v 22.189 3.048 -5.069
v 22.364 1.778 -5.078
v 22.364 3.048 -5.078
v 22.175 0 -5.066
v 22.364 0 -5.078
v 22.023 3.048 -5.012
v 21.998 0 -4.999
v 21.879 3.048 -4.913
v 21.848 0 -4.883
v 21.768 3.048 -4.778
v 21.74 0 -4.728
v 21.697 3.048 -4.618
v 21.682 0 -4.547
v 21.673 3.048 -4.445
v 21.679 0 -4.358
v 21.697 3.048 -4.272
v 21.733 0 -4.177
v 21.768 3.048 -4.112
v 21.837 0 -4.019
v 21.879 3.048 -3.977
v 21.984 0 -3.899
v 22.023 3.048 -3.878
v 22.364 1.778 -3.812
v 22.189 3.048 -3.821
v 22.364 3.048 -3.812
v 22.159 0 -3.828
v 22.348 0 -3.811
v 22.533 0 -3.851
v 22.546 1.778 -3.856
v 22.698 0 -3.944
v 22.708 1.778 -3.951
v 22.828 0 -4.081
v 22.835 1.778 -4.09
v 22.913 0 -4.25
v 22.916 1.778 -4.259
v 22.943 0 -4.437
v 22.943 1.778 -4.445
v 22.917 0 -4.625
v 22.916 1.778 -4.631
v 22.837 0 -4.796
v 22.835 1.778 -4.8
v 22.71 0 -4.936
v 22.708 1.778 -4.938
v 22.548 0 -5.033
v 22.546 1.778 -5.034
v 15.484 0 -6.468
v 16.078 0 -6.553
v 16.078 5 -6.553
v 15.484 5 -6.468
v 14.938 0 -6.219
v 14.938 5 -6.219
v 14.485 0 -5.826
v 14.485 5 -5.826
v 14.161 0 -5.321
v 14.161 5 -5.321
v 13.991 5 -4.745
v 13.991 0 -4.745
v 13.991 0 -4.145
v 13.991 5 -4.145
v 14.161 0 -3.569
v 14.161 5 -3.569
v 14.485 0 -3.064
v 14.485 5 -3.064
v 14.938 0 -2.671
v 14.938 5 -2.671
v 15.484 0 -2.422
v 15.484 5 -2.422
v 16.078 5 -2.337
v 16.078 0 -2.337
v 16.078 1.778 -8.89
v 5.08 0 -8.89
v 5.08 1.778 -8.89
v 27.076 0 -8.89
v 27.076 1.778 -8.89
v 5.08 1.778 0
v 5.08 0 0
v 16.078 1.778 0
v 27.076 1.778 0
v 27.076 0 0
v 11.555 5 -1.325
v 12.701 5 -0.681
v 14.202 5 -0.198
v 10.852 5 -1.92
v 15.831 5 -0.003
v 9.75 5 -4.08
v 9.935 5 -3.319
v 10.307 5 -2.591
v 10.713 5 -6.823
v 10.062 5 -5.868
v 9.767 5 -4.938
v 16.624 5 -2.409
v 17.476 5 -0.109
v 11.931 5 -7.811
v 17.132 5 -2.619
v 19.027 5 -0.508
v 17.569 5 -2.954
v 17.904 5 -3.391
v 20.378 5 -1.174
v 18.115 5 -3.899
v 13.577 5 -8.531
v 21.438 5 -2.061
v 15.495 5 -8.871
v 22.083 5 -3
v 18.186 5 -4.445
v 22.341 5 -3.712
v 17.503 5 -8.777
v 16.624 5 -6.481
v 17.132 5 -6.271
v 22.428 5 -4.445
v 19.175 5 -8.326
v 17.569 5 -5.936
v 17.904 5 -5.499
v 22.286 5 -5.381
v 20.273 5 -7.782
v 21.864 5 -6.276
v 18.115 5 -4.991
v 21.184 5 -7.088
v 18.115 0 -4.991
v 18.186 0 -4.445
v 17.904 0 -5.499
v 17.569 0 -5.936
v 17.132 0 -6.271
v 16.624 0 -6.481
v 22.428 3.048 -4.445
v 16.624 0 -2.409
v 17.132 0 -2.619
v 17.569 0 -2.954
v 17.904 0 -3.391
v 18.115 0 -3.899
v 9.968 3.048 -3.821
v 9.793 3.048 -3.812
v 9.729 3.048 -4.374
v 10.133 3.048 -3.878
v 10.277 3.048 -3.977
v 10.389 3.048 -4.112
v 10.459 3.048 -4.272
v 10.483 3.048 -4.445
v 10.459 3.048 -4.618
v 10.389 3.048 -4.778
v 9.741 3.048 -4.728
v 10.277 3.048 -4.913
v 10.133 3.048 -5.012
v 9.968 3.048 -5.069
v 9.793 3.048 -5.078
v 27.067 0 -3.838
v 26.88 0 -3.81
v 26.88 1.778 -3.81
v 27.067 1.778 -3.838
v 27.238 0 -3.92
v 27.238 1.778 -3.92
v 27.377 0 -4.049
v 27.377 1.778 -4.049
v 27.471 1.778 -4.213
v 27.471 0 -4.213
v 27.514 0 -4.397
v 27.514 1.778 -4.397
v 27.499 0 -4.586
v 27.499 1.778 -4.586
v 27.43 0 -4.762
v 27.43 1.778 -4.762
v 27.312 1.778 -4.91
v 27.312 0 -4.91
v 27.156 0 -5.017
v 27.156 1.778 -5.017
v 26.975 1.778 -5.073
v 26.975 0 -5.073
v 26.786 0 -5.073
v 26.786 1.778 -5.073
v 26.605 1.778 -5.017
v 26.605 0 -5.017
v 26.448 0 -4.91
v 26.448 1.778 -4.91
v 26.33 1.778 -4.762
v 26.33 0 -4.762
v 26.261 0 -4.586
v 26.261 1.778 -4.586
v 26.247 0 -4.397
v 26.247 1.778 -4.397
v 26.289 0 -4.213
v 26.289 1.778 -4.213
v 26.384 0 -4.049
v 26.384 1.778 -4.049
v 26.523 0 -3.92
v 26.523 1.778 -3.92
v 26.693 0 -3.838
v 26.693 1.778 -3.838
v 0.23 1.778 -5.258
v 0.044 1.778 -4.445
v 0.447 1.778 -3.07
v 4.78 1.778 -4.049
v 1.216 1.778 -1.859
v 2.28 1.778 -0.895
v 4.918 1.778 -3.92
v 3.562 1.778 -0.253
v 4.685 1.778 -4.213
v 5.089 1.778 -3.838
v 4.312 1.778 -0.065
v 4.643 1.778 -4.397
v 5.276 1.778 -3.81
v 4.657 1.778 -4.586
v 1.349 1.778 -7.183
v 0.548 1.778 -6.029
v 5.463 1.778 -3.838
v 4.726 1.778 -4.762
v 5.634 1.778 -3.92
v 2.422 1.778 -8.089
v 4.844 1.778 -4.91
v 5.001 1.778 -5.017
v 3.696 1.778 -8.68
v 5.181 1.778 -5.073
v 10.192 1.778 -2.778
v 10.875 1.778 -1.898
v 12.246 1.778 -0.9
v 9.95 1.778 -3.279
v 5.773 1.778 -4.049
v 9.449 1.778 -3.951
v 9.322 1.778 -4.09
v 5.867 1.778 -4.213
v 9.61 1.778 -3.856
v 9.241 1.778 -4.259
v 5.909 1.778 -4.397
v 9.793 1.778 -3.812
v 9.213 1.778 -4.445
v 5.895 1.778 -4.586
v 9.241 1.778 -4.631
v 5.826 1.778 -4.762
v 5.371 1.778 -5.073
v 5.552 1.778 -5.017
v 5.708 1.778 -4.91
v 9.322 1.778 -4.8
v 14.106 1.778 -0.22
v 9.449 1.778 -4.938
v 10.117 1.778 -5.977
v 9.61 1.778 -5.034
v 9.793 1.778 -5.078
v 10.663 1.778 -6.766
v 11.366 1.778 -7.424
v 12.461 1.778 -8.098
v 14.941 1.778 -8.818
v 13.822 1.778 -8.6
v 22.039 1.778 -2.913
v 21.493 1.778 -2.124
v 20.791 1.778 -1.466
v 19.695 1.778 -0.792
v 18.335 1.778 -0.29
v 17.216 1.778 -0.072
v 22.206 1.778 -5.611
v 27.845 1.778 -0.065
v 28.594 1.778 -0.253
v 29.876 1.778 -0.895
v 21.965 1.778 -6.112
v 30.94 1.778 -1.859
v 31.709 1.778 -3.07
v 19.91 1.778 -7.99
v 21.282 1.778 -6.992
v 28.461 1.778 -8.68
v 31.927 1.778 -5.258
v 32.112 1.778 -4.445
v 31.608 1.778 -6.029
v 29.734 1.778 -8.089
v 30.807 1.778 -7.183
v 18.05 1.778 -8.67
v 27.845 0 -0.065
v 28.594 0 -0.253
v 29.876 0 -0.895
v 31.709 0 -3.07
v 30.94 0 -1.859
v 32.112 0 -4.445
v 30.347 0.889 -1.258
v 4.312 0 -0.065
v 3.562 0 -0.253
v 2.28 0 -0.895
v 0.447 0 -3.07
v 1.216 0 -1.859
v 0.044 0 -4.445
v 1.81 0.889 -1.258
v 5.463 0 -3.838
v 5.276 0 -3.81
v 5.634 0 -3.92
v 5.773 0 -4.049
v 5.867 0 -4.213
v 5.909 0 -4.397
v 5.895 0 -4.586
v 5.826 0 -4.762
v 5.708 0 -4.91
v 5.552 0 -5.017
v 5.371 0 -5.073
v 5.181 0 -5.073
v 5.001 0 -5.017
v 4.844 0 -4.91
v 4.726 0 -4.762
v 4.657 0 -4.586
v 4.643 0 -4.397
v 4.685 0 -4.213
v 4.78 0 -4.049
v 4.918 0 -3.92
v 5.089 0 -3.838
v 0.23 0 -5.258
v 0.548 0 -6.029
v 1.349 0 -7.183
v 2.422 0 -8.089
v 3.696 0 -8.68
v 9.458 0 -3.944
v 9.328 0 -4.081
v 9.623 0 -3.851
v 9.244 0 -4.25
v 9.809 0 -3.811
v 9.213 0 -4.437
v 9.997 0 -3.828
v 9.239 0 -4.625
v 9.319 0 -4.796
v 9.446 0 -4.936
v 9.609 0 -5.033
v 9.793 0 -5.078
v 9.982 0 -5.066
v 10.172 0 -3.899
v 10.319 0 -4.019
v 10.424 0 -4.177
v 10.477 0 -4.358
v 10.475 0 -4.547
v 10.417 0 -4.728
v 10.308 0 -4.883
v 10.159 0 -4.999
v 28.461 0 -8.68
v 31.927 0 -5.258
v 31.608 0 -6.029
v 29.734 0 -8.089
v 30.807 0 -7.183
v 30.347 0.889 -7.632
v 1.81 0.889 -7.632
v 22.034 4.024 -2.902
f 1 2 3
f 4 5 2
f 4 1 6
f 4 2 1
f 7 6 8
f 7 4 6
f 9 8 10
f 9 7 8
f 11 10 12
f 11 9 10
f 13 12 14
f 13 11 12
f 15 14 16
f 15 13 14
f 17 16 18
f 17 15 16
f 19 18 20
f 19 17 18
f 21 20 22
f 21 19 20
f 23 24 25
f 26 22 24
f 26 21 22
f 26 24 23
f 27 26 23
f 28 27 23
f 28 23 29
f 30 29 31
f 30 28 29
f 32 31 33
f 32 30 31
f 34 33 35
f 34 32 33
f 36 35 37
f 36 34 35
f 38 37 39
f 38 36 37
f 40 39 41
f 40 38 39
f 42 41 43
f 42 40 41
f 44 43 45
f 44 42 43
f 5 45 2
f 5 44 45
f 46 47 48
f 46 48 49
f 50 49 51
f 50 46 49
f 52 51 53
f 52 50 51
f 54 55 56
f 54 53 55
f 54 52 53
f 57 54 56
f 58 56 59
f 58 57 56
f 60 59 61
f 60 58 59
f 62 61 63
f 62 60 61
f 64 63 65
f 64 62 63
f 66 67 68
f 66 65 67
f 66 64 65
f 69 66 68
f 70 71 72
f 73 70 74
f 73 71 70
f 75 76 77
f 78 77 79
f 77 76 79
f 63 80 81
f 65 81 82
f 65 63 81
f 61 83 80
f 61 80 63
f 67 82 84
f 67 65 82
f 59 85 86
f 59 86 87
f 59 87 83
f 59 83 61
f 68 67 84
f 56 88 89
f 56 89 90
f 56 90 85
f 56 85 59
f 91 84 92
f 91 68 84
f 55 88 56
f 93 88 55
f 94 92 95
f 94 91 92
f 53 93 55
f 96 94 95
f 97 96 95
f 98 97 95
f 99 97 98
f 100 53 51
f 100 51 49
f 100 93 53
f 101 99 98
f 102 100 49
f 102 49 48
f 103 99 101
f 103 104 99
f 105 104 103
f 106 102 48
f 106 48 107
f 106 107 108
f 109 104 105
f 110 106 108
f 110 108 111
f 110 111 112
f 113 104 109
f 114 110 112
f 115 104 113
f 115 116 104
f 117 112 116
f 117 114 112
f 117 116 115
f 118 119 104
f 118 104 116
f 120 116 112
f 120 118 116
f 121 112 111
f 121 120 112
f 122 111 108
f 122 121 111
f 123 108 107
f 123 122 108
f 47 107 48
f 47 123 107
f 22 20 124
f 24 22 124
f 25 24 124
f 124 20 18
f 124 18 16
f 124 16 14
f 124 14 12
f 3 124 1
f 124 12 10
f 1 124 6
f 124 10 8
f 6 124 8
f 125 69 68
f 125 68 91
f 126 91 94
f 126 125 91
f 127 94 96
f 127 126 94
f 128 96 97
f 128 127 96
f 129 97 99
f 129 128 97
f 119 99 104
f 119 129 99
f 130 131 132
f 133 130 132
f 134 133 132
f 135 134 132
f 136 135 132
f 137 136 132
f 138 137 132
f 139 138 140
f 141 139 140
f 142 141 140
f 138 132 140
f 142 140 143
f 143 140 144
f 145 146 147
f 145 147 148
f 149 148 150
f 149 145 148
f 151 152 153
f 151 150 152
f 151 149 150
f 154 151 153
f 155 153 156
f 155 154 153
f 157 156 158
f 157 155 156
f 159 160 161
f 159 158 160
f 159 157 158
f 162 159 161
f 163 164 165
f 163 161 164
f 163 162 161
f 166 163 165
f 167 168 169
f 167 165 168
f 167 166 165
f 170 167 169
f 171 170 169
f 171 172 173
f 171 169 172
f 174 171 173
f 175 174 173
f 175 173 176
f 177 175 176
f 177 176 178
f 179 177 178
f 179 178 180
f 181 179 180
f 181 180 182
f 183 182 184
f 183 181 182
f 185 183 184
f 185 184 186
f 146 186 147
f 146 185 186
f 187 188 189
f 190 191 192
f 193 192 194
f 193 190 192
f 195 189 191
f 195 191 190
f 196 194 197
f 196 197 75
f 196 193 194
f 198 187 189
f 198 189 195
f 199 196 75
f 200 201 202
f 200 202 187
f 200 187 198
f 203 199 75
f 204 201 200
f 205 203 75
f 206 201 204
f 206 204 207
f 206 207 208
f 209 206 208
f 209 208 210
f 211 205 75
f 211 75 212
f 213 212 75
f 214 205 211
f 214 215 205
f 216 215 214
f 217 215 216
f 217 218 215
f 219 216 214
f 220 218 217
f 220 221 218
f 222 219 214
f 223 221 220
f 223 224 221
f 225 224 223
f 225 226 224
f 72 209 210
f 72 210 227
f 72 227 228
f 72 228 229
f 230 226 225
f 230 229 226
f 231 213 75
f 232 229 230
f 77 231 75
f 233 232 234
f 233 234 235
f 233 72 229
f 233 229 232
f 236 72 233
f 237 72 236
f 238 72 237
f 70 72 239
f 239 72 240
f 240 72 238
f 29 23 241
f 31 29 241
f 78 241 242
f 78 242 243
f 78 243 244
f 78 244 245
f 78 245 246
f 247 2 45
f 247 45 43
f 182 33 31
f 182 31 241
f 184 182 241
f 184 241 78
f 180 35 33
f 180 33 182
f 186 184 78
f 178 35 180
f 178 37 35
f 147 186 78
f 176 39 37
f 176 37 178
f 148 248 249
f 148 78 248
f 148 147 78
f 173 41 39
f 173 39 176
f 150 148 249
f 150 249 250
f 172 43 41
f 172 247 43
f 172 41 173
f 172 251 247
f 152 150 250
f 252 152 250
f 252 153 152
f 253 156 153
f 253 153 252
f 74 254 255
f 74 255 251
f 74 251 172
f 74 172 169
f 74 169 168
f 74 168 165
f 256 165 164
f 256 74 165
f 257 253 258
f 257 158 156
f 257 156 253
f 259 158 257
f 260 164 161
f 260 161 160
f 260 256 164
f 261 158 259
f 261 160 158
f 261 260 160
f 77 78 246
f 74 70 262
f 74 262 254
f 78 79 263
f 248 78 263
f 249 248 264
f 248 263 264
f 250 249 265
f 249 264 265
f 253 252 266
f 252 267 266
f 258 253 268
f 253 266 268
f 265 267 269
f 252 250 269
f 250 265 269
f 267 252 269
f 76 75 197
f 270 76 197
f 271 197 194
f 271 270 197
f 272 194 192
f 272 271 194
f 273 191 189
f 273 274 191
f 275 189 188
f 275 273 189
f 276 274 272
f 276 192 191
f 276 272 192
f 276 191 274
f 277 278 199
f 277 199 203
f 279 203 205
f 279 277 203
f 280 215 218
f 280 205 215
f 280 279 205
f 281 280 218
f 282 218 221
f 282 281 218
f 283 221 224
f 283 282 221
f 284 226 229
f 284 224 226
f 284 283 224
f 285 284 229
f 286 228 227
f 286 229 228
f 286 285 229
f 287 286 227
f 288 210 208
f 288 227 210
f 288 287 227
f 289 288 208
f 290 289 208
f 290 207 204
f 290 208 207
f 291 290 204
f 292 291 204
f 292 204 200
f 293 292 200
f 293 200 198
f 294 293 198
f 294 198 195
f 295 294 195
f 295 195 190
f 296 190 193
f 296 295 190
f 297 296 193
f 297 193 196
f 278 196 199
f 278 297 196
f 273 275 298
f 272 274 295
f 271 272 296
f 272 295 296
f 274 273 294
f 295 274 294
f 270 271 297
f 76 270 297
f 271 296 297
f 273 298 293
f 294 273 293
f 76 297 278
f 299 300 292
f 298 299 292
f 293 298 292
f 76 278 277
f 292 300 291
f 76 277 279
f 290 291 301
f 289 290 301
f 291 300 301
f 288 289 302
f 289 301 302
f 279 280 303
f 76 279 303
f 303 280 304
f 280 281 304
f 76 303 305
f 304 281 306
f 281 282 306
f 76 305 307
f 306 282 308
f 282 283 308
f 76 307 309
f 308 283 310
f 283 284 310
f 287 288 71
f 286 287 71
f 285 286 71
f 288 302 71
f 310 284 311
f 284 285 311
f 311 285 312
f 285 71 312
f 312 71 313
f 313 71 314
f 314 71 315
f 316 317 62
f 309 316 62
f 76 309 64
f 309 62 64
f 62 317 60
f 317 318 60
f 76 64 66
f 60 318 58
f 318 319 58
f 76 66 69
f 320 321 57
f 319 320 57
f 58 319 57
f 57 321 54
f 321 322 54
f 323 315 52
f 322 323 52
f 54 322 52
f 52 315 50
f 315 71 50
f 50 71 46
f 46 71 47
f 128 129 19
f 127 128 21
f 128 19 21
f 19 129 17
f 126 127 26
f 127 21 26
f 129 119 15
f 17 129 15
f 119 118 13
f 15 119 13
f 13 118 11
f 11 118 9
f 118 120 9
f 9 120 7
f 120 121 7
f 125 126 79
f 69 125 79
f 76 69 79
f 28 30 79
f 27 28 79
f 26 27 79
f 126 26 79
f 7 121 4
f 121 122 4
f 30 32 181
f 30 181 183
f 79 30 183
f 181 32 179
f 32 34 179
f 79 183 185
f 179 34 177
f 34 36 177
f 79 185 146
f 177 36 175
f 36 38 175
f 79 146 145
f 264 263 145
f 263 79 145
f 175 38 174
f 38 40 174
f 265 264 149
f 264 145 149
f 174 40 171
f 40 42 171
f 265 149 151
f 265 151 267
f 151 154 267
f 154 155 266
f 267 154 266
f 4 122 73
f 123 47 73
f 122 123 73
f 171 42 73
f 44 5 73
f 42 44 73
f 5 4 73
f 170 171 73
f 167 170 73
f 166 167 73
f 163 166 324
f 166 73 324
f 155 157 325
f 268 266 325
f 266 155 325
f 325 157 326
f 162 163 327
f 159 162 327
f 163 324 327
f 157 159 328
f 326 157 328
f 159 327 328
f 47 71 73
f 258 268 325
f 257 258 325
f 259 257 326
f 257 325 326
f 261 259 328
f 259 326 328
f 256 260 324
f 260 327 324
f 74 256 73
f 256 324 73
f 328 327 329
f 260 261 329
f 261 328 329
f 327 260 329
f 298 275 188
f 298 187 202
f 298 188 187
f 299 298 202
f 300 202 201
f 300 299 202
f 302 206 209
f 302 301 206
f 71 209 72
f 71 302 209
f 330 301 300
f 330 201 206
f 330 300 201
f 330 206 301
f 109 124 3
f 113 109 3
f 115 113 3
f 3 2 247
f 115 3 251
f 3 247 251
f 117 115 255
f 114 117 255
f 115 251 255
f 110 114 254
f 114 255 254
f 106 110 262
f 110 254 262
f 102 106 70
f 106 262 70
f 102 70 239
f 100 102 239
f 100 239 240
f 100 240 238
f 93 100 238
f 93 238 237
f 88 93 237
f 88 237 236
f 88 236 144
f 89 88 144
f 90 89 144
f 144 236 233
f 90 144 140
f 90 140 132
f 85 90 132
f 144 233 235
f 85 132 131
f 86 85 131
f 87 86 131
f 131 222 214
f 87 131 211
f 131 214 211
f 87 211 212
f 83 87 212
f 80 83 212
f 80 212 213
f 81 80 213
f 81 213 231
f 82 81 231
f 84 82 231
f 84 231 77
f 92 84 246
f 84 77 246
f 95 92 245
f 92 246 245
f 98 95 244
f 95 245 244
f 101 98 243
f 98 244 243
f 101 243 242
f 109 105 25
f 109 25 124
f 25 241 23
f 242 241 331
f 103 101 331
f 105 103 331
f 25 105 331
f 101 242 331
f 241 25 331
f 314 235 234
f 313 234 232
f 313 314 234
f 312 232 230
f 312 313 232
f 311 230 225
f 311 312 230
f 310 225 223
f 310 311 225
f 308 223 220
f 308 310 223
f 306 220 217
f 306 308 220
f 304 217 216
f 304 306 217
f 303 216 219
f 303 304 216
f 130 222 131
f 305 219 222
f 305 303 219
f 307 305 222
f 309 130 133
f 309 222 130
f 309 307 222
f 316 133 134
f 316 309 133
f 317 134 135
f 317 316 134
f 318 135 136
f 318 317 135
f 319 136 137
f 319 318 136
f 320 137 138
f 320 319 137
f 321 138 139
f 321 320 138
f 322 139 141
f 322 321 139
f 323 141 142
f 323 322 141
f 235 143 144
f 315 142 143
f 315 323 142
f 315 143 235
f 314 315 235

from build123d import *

# Parameters (mm, degrees)
SKETCH1_W               = 32.1564
SKETCH1_H               = 8.89
SKETCH1_R               = 1.2319
BOSS_EXTRUDE1_DEPTH     = 1.778
CUT_EXTRUDE1_DEPTH      = 32.409990197
CUT_EXTRUDE1_DEPTH_BACK = 34.409990197
CUT_EXTRUDE1_START      = 2
FILLET1_SIZE            = 5.08
SKETCH1_7_RX            = 6.35
SKETCH1_7_RY            = 4.445
BOSS_EXTRUDE2_DEPTH     = 5
CUT_EXTRUDE2_DEPTH      = 34.69313211
CUT_EXTRUDE2_DEPTH_BACK = 34.69313211
CUT_EXTRUDE3_DEPTH      = 1.27
CUT_EXTRUDE3_DEPTH_BACK = 12.7
SKETCH2_R               = 0.635


with BuildPart() as part:
    # Sketch1 → Boss-Extrude1 (new body)
    with BuildSketch(Plane(origin=(0, 0, 0), x_dir=(1, 0, 0), z_dir=(0, 1, 0))):
        with Locations((16.0782, 4.445)):
            Rectangle(SKETCH1_W, SKETCH1_H)
        with Locations(Location((16.0782, 4.445, 0), (0, 0, 270))):
            Circle(SKETCH1_R, mode=Mode.SUBTRACT)
    extrude(amount=BOSS_EXTRUDE1_DEPTH)

    # Sketch1<5> → Cut-Extrude1 (cut, two sides: drawn at the far end of the back side and taken through both)
    with BuildSketch(Plane(origin=(0, 0, 0), x_dir=(1, 0, 0), z_dir=(0, 1, 0)).offset(CUT_EXTRUDE1_START - CUT_EXTRUDE1_DEPTH_BACK)):
        with BuildLine():
            ThreePointArc((18.1864, 4.445), (17.568922516, 5.935722516), (16.0782, 6.5532))
            Line((16.0782, 6.5532), (16.0782, 5.6769))
            ThreePointArc((16.0782, 5.6769), (16.949284844, 5.316084844), (17.3101, 4.445))
            ThreePointArc((17.3101, 4.445), (16.949284844, 3.573915156), (16.0782, 3.2131))
            Line((16.0782, 3.2131), (16.0782, 2.3368))
            ThreePointArc((16.0782, 2.3368), (17.568922516, 2.954277484), (18.1864, 4.445))
        make_face()
        with BuildLine():
            Line((16.0782, 5.6769), (16.0782, 6.5532))
            ThreePointArc((16.0782, 6.5532), (13.97, 4.445), (16.0782, 2.3368))
            Line((16.0782, 2.3368), (16.0782, 3.2131))
            ThreePointArc((16.0782, 3.2131), (14.8463, 4.445), (16.0782, 5.6769))
        make_face()
        with BuildLine():
            ThreePointArc((17.3101, 4.445), (16.949284844, 5.316084844), (16.0782, 5.6769))
            Line((16.0782, 5.6769), (16.0782, 3.2131))
            ThreePointArc((16.0782, 3.2131), (16.949284844, 3.573915156), (17.3101, 4.445))
        make_face()
        with BuildLine():
            Line((16.0782, 3.2131), (16.0782, 5.6769))
            ThreePointArc((16.0782, 5.6769), (14.8463, 4.445), (16.0782, 3.2131))
        make_face()
    extrude(amount=CUT_EXTRUDE1_DEPTH + CUT_EXTRUDE1_DEPTH_BACK, mode=Mode.SUBTRACT)

    # Fillet1
    # a fillet whose section is not a circle: 5.08 mm, written as the material it takes off along each edge
    with BuildSketch(Plane(origin=(32.1564, -12.7, -8.89), x_dir=(0, 0, 1), z_dir=(0, 1, 0)), Plane(origin=(32.1564, -12.7, 0), x_dir=(-1, 0, 0), z_dir=(0, 1, 0))) as fillet1_piece_1:
        with BuildLine():
            Bezier((FILLET1_SIZE, 0), (0, 0), (0, -FILLET1_SIZE), weights=[1, 0.666666667, 1])
            Line((0, -FILLET1_SIZE), (0, 0))
            Line((0, 0), (FILLET1_SIZE, 0))
        make_face()
    extrude(amount=27.178, mode=Mode.SUBTRACT)
    with BuildSketch(Plane(origin=(0, -12.7, -8.89), x_dir=(0, 0, 1), z_dir=(0, 1, 0)), Plane(origin=(0, -12.7, 0), x_dir=(1, 0, 0), z_dir=(0, 1, 0))) as fillet1_piece_2:
        with BuildLine():
            Bezier((FILLET1_SIZE, 0), (0, 0), (0, FILLET1_SIZE), weights=[1, 0.666666667, 1])
            Line((0, FILLET1_SIZE), (0, 0))
            Line((0, 0), (FILLET1_SIZE, 0))
        make_face()
    extrude(amount=27.178, mode=Mode.SUBTRACT)

    # Sketch1<7> → Boss-Extrude2 (add)
    with BuildSketch(Plane(origin=(0, 0, 0), x_dir=(1, 0, 0), z_dir=(0, 1, 0))):
        with Locations(Location((16.0782, 4.445), (0, 0, 0))):
            Ellipse(SKETCH1_7_RX, SKETCH1_7_RY)
    extrude(amount=BOSS_EXTRUDE2_DEPTH)

    # Sketch1<8> → Cut-Extrude2 (cut, two sides: drawn at the far end of the back side and taken through both)
    with BuildSketch(Plane(origin=(0, 0, 0), x_dir=(1, 0, 0), z_dir=(0, 1, 0)).offset(-CUT_EXTRUDE2_DEPTH_BACK)):
        with BuildLine():
            ThreePointArc((18.1864, 4.445), (17.568922516, 5.935722516), (16.0782, 6.5532))
            Line((16.0782, 6.5532), (16.0782, 5.6769))
            ThreePointArc((16.0782, 5.6769), (16.949284844, 5.316084844), (17.3101, 4.445))
            ThreePointArc((17.3101, 4.445), (16.949284844, 3.573915156), (16.0782, 3.2131))
            Line((16.0782, 3.2131), (16.0782, 2.3368))
            ThreePointArc((16.0782, 2.3368), (17.568922516, 2.954277484), (18.1864, 4.445))
        make_face()
        with BuildLine():
            Line((16.0782, 5.6769), (16.0782, 6.5532))
            ThreePointArc((16.0782, 6.5532), (13.97, 4.445), (16.0782, 2.3368))
            Line((16.0782, 2.3368), (16.0782, 3.2131))
            ThreePointArc((16.0782, 3.2131), (14.8463, 4.445), (16.0782, 5.6769))
        make_face()
    extrude(amount=CUT_EXTRUDE2_DEPTH + CUT_EXTRUDE2_DEPTH_BACK, mode=Mode.SUBTRACT)


with BuildPart() as cut_extrude2_kept_piece:
    # of the separate pieces the step leaves, the one the design keeps (cut_extrude2_pieces_kept)
    add(part.part.solids().sort_by_distance((5.08, 0, 0))[0])

    # Sketch2 → Cut-Extrude3 (cut, two sides: drawn at the far end of the back side and taken through both)
    with BuildSketch(Plane(origin=(0, 1.778, 0), x_dir=(1, 0, 0), z_dir=(0, 1, 0)).offset(-CUT_EXTRUDE3_DEPTH_BACK)):
        with Locations(Location((9.848128616, 4.444938826, 0), (0, 0, 94.99673829))):
            Circle(SKETCH2_R)
        with Locations(Location((5.276128616, 4.444938826, 0), (0, 0, 270))):
            Circle(SKETCH2_R)
        with Locations(Location((22.308288089, 4.444938826, 0), (0, 0, 85.004802362))):
            Circle(SKETCH2_R)
        with Locations(Location((26.880288089, 4.444938826, 0), (0, 0, 270))):
            Circle(SKETCH2_R)
    extrude(amount=CUT_EXTRUDE3_DEPTH + CUT_EXTRUDE3_DEPTH_BACK, mode=Mode.SUBTRACT)


solid = cut_extrude2_kept_piece.part
